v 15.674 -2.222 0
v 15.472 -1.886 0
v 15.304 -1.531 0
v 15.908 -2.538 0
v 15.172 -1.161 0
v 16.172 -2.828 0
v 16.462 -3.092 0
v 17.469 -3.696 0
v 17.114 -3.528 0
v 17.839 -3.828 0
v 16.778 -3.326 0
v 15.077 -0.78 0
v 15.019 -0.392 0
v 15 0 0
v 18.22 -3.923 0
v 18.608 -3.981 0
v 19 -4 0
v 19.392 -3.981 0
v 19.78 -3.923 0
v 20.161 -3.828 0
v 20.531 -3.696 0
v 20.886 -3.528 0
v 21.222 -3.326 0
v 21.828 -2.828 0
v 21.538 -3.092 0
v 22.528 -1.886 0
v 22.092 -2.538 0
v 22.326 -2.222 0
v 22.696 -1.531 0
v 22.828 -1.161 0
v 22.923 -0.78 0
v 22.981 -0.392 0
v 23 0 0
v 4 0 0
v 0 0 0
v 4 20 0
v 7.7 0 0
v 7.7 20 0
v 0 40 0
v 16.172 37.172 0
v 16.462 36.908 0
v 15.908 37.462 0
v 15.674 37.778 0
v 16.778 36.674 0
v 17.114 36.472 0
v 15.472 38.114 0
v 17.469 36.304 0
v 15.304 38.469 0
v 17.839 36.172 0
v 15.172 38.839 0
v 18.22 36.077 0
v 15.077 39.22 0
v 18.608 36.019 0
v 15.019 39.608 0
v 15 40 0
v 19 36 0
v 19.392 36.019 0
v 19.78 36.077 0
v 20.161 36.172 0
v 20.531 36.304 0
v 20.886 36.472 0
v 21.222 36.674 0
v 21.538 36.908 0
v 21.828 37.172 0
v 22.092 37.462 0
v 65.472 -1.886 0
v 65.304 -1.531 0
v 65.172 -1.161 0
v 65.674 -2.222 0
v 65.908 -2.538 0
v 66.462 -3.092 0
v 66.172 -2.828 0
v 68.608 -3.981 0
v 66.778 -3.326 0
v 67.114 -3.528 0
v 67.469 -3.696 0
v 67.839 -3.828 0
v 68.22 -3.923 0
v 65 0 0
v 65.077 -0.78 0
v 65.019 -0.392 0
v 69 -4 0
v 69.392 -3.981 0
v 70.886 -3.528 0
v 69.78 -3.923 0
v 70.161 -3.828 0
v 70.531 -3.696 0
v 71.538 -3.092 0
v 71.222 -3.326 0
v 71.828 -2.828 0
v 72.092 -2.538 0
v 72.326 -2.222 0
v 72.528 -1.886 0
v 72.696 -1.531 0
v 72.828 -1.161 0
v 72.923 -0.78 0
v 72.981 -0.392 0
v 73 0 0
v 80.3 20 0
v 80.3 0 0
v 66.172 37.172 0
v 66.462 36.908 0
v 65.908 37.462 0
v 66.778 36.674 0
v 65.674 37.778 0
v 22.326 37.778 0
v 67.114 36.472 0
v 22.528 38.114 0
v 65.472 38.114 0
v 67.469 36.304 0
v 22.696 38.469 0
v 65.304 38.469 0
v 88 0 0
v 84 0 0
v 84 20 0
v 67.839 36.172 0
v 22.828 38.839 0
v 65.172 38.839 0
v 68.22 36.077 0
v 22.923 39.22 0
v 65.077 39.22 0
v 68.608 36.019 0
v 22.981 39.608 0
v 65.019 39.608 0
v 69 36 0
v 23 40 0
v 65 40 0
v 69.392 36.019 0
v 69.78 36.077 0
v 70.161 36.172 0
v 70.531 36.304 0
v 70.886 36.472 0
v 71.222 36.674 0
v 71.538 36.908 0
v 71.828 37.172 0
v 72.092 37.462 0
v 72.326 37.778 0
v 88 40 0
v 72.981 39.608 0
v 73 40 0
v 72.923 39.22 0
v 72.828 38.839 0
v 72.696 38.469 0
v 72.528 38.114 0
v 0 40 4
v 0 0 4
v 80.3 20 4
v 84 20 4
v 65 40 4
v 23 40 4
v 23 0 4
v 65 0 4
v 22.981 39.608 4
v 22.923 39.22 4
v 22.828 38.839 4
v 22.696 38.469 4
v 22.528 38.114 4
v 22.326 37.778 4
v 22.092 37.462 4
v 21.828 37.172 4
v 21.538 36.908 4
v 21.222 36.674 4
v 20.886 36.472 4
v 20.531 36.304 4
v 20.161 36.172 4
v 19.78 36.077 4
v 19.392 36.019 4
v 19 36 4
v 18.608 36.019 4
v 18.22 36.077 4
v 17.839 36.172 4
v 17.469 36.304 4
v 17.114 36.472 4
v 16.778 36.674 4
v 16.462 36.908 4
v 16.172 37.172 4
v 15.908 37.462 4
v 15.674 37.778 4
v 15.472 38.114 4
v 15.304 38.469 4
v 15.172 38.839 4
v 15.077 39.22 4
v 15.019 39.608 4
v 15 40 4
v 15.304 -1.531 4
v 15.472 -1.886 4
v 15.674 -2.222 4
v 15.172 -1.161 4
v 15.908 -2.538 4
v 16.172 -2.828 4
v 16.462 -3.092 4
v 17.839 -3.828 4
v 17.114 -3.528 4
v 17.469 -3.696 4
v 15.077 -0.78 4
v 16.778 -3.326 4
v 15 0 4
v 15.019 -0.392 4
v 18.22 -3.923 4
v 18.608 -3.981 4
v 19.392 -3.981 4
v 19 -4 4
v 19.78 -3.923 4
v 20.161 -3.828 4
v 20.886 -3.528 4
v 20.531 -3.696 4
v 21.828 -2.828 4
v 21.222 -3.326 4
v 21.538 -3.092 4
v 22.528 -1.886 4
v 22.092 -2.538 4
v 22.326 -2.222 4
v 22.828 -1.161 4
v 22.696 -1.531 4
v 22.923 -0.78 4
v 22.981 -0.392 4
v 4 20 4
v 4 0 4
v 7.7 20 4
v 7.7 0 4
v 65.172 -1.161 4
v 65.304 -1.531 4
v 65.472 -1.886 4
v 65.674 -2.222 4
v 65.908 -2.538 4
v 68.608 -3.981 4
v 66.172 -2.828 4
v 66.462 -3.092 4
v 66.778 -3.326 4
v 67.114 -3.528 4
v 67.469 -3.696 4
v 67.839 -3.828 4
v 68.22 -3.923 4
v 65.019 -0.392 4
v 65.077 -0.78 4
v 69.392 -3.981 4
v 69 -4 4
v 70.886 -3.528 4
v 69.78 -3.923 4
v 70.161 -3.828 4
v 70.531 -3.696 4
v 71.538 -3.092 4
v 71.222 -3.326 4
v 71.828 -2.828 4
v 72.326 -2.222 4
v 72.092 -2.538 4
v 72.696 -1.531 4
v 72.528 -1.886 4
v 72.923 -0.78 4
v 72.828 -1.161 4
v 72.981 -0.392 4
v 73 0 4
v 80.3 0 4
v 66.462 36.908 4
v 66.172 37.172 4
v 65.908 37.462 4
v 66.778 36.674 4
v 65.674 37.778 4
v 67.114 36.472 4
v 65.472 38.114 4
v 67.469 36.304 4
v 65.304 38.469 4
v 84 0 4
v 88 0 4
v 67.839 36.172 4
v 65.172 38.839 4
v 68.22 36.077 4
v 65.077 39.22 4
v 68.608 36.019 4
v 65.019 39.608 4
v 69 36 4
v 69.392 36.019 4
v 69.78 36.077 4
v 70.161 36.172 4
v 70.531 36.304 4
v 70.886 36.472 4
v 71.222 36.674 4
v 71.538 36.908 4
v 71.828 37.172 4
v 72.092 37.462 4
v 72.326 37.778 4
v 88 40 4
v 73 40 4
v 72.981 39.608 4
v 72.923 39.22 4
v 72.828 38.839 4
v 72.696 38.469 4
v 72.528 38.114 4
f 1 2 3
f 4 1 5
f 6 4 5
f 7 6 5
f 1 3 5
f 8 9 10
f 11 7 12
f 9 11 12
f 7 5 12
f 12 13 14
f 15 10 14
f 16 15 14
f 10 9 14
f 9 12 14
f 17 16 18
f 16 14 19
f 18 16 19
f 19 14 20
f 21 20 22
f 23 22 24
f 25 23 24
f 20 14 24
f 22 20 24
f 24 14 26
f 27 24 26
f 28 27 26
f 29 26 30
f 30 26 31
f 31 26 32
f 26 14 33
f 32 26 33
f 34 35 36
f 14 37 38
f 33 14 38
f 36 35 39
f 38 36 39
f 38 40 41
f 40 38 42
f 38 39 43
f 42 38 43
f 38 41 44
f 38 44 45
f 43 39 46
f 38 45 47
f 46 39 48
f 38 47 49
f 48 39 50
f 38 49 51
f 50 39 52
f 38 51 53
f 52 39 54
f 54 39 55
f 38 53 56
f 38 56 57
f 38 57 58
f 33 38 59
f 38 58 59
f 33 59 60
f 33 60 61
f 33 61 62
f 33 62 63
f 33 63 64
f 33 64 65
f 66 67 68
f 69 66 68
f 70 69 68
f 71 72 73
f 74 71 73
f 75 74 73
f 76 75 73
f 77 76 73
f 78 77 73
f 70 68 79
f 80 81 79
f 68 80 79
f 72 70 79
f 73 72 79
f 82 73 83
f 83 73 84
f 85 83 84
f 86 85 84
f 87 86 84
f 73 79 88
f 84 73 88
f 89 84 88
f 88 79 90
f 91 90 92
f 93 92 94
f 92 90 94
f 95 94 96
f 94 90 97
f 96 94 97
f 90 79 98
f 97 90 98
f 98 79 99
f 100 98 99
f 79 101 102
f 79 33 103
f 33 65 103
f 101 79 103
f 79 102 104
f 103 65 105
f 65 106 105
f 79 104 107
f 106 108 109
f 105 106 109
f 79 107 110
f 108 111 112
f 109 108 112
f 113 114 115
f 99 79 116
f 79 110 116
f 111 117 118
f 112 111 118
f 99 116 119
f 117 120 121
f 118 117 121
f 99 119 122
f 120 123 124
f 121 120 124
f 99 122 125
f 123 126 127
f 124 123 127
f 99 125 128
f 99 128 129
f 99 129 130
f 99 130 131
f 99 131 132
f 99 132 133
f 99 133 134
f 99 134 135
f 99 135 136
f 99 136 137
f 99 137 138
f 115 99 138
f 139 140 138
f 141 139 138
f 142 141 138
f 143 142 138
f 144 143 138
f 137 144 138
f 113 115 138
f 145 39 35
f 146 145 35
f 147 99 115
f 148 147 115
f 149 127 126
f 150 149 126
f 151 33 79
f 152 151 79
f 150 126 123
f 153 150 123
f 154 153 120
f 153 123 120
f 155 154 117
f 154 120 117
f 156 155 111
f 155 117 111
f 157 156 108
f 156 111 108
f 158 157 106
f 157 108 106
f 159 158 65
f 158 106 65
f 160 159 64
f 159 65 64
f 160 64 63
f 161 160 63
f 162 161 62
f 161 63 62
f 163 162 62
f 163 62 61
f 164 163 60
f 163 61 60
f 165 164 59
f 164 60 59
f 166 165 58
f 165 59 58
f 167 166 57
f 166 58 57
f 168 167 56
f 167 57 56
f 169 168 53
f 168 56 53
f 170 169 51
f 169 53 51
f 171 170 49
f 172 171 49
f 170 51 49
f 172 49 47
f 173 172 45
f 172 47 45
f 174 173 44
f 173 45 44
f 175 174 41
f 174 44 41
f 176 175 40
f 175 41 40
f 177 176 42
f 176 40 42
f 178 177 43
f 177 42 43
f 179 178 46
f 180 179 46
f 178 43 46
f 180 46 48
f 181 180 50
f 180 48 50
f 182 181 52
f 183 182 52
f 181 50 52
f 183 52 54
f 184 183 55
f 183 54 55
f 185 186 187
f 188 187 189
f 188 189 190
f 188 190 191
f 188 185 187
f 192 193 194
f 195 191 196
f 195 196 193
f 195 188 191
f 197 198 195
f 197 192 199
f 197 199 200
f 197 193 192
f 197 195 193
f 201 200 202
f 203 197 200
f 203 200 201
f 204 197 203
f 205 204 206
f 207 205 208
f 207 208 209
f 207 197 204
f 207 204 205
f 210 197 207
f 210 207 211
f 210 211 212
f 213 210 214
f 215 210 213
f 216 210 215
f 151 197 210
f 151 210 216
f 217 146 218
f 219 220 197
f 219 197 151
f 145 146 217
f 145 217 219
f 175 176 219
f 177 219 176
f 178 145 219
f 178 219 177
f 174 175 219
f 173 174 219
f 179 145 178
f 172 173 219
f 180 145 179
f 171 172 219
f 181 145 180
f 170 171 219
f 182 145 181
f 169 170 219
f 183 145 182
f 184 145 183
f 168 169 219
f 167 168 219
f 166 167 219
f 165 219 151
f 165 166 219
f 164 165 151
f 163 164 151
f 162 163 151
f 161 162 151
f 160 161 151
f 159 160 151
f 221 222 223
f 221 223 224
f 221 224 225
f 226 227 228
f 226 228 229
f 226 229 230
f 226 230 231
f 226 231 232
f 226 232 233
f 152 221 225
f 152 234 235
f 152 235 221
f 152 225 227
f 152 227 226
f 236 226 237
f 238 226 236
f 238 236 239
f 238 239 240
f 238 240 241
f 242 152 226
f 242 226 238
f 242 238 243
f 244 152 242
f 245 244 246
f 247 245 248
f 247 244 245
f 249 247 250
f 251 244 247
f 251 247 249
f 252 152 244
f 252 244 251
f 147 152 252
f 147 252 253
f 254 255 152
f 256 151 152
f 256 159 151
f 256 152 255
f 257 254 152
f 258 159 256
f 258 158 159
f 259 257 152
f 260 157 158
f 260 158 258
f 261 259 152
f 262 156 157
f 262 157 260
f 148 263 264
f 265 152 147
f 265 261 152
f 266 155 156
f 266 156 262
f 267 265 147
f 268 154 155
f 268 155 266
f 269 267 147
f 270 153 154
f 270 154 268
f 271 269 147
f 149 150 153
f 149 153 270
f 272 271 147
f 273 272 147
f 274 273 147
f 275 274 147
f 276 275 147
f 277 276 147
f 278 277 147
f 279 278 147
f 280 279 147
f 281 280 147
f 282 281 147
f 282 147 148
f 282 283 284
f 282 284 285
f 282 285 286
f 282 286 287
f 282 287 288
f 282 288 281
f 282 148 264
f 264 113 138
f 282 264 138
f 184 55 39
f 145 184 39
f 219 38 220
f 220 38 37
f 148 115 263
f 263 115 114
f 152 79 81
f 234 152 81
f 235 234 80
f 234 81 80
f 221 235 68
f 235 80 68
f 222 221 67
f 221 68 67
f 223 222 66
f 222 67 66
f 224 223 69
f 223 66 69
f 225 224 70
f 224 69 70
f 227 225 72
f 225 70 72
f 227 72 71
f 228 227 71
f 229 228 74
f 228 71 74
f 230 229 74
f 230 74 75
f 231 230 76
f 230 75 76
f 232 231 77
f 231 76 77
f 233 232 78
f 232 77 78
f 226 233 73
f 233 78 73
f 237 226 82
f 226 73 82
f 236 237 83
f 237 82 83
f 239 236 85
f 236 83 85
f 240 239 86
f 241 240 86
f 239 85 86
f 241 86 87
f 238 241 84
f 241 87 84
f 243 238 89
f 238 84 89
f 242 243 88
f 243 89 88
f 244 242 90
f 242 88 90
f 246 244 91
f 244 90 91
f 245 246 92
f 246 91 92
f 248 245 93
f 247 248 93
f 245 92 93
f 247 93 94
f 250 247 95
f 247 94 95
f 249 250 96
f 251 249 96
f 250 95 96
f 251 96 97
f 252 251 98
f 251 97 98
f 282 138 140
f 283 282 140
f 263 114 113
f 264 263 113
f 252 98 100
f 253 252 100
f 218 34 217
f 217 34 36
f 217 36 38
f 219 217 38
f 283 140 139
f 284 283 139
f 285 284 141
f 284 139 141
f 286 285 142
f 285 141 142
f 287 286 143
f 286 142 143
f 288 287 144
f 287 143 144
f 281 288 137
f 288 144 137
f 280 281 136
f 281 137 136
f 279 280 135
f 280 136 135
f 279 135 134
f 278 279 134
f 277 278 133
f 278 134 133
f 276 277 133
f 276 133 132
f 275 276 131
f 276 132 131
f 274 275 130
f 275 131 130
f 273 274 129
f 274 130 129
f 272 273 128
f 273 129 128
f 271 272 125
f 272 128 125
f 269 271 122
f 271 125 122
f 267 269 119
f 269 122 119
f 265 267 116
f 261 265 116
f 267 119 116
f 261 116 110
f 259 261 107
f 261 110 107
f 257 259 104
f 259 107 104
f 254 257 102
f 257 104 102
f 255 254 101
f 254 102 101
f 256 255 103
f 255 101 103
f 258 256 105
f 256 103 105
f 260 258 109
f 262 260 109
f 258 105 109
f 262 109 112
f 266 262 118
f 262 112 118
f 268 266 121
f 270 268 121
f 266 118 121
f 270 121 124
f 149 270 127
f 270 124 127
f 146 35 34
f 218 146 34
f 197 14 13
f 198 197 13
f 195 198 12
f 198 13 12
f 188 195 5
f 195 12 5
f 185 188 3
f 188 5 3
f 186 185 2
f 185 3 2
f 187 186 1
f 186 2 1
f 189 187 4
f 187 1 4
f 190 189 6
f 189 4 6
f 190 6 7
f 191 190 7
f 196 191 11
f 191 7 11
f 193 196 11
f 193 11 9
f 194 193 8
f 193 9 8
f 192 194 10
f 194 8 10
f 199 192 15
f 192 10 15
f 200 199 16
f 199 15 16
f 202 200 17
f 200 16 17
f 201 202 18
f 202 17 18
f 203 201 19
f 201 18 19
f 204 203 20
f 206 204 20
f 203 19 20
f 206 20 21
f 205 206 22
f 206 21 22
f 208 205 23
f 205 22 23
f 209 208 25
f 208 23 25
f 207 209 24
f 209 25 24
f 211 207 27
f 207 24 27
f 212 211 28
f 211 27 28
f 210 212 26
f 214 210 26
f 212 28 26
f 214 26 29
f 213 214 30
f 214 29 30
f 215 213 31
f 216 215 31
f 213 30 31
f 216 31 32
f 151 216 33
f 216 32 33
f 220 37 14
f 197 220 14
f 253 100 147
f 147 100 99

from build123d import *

# Parameters (mm, degrees)
BOSS_EXTRUDE1_DEPTH = 4


with BuildPart() as part:
    # Sketch1 → Boss-Extrude1 (new body)
    with BuildSketch(Plane.XY):
        with BuildLine():
            Line((7.7, 0), (15, 0))
            ThreePointArc((15, 0), (19, -4), (23, 0))
            Line((23, 0), (65, 0))
            ThreePointArc((65, 0), (69, -4), (73, 0))
            Line((73, 0), (80.3, 0))
            Line((80.3, 0), (80.3, 20))
            Line((80.3, 20), (84, 20))
            Line((84, 20), (84, 0))
            Line((84, 0), (88, 0))
            Line((88, 0), (88, 40))
            Line((88, 40), (73, 40))
            ThreePointArc((73, 40), (69, 36), (65, 40))
            Line((65, 40), (23, 40))
            ThreePointArc((23, 40), (19, 36), (15, 40))
            Line((15, 40), (0, 40))
            Line((0, 40), (0, 0))
            Line((0, 0), (4, 0))
            Line((4, 0), (4, 20))
            Line((4, 20), (7.7, 20))
            Line((7.7, 20), (7.7, 0))
        make_face()
    extrude(amount=BOSS_EXTRUDE1_DEPTH)


solid = part.part
